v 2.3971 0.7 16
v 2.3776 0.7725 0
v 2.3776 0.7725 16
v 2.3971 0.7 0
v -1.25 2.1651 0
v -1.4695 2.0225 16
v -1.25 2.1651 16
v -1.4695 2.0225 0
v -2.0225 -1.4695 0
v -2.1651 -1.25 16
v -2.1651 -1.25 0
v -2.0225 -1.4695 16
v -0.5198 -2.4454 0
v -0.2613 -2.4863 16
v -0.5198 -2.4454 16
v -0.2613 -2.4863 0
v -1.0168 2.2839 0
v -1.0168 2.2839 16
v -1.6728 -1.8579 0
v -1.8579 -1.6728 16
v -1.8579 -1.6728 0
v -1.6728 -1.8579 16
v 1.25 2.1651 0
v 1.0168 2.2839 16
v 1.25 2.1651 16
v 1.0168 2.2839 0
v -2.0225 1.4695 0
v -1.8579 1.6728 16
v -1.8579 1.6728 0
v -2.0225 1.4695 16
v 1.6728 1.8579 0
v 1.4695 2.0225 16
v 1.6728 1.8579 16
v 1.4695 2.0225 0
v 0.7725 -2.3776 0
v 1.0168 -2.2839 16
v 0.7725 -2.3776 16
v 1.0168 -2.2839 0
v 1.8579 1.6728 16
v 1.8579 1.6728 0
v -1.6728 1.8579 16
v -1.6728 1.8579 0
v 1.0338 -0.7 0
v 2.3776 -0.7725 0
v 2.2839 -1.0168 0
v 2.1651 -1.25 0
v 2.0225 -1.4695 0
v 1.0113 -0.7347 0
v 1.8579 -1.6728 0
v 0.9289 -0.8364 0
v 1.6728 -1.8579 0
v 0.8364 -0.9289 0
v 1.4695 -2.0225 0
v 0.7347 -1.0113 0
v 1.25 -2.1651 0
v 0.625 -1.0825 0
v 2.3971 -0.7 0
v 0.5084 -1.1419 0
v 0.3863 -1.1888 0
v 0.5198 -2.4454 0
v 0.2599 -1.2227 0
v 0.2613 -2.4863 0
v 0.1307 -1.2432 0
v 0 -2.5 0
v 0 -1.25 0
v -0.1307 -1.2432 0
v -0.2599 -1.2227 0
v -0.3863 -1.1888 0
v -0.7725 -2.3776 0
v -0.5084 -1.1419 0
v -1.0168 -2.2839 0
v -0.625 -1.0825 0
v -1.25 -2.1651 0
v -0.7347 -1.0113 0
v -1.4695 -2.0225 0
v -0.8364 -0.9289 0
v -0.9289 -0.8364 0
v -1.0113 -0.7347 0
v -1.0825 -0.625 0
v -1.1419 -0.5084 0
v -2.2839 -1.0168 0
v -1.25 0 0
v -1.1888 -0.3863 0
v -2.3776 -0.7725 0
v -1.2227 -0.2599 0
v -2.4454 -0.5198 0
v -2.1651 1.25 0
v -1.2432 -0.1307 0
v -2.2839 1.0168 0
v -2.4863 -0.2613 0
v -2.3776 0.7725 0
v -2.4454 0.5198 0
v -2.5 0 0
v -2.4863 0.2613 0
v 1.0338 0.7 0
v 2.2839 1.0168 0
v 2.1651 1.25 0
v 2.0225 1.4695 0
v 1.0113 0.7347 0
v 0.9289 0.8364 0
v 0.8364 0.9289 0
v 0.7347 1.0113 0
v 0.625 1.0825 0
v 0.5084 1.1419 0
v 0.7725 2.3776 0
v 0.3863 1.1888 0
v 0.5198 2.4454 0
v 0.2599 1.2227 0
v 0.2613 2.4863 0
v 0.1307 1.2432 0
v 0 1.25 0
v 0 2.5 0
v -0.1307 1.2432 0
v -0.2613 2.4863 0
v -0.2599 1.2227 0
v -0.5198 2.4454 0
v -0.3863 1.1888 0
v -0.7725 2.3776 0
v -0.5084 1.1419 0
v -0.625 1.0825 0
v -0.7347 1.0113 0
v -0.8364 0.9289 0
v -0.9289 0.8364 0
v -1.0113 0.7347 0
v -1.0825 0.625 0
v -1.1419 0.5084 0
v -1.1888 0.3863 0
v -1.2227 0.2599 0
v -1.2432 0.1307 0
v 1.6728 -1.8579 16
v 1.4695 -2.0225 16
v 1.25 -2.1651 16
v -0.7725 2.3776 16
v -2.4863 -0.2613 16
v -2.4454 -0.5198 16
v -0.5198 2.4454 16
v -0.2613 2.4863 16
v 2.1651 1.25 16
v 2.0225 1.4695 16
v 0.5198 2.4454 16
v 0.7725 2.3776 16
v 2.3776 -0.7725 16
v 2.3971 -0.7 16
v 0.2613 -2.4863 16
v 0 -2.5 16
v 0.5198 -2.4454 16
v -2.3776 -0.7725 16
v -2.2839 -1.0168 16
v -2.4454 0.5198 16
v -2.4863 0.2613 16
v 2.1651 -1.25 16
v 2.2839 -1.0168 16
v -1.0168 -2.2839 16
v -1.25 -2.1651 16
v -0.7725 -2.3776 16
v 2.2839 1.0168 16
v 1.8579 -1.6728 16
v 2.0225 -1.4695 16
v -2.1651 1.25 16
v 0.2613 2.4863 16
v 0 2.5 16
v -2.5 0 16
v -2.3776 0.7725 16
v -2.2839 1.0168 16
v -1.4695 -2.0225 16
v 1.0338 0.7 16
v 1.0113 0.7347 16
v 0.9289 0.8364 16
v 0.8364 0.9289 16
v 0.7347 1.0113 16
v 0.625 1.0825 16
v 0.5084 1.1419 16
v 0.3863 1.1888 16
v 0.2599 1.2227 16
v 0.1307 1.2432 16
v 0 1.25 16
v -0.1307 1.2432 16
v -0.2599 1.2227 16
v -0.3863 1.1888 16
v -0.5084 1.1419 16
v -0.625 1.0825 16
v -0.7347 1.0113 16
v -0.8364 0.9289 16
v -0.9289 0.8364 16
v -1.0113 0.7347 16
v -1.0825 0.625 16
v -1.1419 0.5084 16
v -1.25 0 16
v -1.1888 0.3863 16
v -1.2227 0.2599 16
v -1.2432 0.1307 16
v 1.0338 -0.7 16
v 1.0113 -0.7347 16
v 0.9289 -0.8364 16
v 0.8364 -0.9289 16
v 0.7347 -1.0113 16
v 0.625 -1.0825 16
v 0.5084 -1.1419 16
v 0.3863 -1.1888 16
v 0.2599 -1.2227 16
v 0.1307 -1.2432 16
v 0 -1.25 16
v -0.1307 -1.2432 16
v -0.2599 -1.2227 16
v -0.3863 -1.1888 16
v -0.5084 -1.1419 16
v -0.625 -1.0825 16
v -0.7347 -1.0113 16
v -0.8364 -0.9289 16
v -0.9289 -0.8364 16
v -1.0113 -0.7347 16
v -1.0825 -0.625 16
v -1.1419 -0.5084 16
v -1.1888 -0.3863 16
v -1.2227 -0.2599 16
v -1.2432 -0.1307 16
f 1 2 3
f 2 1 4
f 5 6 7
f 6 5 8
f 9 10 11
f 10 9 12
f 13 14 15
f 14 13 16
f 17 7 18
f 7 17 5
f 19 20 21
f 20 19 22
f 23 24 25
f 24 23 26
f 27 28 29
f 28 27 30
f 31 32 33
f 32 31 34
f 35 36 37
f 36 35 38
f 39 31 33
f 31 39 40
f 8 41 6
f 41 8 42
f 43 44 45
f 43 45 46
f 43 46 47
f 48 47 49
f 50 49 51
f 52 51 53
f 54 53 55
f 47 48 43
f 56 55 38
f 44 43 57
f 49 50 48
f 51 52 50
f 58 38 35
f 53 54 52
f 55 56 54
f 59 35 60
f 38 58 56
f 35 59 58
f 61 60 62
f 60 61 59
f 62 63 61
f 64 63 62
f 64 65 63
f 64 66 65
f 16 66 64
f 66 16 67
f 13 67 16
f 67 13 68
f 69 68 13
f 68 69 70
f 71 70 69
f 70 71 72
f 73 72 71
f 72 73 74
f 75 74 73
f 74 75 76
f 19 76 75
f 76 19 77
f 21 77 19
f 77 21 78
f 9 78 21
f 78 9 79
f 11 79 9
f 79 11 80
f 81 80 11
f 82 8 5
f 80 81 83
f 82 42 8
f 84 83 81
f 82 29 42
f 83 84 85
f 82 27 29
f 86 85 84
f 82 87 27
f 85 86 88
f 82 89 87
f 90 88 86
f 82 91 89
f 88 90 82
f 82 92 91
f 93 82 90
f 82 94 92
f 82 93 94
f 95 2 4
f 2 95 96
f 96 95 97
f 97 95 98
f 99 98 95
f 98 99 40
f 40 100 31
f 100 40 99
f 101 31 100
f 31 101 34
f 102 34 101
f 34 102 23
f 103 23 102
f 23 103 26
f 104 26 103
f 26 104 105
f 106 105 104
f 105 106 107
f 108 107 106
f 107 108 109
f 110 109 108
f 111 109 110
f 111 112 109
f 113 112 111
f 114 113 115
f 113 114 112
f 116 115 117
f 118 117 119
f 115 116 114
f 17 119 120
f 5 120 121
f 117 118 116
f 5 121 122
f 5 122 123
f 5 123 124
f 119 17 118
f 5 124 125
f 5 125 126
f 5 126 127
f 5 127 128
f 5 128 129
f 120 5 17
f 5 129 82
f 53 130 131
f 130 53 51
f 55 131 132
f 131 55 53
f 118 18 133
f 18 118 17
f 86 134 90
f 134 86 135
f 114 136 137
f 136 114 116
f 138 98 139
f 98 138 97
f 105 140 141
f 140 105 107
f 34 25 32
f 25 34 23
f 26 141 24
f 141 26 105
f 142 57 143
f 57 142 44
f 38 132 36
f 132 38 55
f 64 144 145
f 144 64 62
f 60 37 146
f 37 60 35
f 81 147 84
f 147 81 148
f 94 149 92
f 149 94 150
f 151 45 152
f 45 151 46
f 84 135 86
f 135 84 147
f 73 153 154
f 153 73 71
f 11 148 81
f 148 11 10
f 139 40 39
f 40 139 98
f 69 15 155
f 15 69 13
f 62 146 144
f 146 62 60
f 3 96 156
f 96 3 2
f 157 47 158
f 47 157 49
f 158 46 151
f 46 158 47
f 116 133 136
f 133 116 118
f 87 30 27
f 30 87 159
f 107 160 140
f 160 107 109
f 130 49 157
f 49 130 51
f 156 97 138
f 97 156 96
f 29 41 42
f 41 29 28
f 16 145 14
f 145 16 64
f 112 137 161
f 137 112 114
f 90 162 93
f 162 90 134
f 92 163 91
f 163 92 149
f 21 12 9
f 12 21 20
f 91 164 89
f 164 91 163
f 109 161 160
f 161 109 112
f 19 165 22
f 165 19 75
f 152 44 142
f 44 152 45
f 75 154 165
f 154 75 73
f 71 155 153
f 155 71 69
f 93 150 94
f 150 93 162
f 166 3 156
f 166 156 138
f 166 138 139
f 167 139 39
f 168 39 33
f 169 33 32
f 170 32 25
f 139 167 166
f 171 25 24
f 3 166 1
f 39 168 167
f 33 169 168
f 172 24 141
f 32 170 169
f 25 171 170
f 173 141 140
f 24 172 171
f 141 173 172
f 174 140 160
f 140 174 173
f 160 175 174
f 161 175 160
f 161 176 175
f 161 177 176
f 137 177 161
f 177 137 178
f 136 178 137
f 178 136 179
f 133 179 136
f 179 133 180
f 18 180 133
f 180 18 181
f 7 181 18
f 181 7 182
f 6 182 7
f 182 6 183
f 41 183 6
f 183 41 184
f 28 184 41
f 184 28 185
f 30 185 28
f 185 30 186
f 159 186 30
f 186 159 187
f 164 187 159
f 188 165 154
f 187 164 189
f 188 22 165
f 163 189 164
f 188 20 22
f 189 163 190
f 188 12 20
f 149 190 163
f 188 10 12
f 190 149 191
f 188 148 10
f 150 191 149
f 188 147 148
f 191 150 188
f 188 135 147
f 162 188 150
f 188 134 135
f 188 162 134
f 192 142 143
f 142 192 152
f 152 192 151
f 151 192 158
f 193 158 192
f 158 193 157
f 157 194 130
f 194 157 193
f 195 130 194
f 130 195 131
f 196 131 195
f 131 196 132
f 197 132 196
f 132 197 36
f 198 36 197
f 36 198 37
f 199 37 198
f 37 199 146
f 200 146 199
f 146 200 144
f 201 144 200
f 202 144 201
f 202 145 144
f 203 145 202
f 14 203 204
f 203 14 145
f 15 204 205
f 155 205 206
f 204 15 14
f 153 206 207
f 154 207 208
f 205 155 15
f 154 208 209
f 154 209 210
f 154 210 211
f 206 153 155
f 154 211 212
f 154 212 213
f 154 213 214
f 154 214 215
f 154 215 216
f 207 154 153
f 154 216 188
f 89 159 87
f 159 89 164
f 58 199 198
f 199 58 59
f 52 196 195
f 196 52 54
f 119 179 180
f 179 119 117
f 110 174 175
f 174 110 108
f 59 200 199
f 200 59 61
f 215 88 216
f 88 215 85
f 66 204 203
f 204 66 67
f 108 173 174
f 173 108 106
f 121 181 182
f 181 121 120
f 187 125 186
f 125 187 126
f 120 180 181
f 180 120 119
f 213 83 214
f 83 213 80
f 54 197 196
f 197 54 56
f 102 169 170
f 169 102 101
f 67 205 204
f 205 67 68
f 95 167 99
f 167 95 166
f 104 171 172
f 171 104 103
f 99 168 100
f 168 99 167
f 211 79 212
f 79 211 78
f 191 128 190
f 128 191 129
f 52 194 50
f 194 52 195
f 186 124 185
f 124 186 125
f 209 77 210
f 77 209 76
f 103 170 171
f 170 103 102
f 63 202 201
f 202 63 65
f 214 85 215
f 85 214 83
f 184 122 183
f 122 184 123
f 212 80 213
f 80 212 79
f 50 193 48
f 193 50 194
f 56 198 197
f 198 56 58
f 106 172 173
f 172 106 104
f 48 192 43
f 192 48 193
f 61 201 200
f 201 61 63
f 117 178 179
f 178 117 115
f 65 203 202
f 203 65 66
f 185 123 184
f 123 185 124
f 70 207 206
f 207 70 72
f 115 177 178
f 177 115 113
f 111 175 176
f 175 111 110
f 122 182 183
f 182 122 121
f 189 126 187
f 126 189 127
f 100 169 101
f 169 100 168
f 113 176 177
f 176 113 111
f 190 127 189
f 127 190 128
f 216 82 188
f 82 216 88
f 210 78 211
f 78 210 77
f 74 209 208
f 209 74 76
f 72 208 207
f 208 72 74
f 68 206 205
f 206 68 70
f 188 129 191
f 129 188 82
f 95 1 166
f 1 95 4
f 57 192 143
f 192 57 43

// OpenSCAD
// Slotted roll pin.
$fn = 60;
eps = 0.02;
inner_d = 2.5;
outer_d = 5;
length = 16;
slot = 1.4;
difference() {
    cylinder(d=outer_d,h=length);
    translate([0,0,-eps]) cylinder(d=inner_d,h=length+2*eps);
    translate([0,-slot/2,-eps]) cube([outer_d/2+eps,slot,length+2*eps]);
}
